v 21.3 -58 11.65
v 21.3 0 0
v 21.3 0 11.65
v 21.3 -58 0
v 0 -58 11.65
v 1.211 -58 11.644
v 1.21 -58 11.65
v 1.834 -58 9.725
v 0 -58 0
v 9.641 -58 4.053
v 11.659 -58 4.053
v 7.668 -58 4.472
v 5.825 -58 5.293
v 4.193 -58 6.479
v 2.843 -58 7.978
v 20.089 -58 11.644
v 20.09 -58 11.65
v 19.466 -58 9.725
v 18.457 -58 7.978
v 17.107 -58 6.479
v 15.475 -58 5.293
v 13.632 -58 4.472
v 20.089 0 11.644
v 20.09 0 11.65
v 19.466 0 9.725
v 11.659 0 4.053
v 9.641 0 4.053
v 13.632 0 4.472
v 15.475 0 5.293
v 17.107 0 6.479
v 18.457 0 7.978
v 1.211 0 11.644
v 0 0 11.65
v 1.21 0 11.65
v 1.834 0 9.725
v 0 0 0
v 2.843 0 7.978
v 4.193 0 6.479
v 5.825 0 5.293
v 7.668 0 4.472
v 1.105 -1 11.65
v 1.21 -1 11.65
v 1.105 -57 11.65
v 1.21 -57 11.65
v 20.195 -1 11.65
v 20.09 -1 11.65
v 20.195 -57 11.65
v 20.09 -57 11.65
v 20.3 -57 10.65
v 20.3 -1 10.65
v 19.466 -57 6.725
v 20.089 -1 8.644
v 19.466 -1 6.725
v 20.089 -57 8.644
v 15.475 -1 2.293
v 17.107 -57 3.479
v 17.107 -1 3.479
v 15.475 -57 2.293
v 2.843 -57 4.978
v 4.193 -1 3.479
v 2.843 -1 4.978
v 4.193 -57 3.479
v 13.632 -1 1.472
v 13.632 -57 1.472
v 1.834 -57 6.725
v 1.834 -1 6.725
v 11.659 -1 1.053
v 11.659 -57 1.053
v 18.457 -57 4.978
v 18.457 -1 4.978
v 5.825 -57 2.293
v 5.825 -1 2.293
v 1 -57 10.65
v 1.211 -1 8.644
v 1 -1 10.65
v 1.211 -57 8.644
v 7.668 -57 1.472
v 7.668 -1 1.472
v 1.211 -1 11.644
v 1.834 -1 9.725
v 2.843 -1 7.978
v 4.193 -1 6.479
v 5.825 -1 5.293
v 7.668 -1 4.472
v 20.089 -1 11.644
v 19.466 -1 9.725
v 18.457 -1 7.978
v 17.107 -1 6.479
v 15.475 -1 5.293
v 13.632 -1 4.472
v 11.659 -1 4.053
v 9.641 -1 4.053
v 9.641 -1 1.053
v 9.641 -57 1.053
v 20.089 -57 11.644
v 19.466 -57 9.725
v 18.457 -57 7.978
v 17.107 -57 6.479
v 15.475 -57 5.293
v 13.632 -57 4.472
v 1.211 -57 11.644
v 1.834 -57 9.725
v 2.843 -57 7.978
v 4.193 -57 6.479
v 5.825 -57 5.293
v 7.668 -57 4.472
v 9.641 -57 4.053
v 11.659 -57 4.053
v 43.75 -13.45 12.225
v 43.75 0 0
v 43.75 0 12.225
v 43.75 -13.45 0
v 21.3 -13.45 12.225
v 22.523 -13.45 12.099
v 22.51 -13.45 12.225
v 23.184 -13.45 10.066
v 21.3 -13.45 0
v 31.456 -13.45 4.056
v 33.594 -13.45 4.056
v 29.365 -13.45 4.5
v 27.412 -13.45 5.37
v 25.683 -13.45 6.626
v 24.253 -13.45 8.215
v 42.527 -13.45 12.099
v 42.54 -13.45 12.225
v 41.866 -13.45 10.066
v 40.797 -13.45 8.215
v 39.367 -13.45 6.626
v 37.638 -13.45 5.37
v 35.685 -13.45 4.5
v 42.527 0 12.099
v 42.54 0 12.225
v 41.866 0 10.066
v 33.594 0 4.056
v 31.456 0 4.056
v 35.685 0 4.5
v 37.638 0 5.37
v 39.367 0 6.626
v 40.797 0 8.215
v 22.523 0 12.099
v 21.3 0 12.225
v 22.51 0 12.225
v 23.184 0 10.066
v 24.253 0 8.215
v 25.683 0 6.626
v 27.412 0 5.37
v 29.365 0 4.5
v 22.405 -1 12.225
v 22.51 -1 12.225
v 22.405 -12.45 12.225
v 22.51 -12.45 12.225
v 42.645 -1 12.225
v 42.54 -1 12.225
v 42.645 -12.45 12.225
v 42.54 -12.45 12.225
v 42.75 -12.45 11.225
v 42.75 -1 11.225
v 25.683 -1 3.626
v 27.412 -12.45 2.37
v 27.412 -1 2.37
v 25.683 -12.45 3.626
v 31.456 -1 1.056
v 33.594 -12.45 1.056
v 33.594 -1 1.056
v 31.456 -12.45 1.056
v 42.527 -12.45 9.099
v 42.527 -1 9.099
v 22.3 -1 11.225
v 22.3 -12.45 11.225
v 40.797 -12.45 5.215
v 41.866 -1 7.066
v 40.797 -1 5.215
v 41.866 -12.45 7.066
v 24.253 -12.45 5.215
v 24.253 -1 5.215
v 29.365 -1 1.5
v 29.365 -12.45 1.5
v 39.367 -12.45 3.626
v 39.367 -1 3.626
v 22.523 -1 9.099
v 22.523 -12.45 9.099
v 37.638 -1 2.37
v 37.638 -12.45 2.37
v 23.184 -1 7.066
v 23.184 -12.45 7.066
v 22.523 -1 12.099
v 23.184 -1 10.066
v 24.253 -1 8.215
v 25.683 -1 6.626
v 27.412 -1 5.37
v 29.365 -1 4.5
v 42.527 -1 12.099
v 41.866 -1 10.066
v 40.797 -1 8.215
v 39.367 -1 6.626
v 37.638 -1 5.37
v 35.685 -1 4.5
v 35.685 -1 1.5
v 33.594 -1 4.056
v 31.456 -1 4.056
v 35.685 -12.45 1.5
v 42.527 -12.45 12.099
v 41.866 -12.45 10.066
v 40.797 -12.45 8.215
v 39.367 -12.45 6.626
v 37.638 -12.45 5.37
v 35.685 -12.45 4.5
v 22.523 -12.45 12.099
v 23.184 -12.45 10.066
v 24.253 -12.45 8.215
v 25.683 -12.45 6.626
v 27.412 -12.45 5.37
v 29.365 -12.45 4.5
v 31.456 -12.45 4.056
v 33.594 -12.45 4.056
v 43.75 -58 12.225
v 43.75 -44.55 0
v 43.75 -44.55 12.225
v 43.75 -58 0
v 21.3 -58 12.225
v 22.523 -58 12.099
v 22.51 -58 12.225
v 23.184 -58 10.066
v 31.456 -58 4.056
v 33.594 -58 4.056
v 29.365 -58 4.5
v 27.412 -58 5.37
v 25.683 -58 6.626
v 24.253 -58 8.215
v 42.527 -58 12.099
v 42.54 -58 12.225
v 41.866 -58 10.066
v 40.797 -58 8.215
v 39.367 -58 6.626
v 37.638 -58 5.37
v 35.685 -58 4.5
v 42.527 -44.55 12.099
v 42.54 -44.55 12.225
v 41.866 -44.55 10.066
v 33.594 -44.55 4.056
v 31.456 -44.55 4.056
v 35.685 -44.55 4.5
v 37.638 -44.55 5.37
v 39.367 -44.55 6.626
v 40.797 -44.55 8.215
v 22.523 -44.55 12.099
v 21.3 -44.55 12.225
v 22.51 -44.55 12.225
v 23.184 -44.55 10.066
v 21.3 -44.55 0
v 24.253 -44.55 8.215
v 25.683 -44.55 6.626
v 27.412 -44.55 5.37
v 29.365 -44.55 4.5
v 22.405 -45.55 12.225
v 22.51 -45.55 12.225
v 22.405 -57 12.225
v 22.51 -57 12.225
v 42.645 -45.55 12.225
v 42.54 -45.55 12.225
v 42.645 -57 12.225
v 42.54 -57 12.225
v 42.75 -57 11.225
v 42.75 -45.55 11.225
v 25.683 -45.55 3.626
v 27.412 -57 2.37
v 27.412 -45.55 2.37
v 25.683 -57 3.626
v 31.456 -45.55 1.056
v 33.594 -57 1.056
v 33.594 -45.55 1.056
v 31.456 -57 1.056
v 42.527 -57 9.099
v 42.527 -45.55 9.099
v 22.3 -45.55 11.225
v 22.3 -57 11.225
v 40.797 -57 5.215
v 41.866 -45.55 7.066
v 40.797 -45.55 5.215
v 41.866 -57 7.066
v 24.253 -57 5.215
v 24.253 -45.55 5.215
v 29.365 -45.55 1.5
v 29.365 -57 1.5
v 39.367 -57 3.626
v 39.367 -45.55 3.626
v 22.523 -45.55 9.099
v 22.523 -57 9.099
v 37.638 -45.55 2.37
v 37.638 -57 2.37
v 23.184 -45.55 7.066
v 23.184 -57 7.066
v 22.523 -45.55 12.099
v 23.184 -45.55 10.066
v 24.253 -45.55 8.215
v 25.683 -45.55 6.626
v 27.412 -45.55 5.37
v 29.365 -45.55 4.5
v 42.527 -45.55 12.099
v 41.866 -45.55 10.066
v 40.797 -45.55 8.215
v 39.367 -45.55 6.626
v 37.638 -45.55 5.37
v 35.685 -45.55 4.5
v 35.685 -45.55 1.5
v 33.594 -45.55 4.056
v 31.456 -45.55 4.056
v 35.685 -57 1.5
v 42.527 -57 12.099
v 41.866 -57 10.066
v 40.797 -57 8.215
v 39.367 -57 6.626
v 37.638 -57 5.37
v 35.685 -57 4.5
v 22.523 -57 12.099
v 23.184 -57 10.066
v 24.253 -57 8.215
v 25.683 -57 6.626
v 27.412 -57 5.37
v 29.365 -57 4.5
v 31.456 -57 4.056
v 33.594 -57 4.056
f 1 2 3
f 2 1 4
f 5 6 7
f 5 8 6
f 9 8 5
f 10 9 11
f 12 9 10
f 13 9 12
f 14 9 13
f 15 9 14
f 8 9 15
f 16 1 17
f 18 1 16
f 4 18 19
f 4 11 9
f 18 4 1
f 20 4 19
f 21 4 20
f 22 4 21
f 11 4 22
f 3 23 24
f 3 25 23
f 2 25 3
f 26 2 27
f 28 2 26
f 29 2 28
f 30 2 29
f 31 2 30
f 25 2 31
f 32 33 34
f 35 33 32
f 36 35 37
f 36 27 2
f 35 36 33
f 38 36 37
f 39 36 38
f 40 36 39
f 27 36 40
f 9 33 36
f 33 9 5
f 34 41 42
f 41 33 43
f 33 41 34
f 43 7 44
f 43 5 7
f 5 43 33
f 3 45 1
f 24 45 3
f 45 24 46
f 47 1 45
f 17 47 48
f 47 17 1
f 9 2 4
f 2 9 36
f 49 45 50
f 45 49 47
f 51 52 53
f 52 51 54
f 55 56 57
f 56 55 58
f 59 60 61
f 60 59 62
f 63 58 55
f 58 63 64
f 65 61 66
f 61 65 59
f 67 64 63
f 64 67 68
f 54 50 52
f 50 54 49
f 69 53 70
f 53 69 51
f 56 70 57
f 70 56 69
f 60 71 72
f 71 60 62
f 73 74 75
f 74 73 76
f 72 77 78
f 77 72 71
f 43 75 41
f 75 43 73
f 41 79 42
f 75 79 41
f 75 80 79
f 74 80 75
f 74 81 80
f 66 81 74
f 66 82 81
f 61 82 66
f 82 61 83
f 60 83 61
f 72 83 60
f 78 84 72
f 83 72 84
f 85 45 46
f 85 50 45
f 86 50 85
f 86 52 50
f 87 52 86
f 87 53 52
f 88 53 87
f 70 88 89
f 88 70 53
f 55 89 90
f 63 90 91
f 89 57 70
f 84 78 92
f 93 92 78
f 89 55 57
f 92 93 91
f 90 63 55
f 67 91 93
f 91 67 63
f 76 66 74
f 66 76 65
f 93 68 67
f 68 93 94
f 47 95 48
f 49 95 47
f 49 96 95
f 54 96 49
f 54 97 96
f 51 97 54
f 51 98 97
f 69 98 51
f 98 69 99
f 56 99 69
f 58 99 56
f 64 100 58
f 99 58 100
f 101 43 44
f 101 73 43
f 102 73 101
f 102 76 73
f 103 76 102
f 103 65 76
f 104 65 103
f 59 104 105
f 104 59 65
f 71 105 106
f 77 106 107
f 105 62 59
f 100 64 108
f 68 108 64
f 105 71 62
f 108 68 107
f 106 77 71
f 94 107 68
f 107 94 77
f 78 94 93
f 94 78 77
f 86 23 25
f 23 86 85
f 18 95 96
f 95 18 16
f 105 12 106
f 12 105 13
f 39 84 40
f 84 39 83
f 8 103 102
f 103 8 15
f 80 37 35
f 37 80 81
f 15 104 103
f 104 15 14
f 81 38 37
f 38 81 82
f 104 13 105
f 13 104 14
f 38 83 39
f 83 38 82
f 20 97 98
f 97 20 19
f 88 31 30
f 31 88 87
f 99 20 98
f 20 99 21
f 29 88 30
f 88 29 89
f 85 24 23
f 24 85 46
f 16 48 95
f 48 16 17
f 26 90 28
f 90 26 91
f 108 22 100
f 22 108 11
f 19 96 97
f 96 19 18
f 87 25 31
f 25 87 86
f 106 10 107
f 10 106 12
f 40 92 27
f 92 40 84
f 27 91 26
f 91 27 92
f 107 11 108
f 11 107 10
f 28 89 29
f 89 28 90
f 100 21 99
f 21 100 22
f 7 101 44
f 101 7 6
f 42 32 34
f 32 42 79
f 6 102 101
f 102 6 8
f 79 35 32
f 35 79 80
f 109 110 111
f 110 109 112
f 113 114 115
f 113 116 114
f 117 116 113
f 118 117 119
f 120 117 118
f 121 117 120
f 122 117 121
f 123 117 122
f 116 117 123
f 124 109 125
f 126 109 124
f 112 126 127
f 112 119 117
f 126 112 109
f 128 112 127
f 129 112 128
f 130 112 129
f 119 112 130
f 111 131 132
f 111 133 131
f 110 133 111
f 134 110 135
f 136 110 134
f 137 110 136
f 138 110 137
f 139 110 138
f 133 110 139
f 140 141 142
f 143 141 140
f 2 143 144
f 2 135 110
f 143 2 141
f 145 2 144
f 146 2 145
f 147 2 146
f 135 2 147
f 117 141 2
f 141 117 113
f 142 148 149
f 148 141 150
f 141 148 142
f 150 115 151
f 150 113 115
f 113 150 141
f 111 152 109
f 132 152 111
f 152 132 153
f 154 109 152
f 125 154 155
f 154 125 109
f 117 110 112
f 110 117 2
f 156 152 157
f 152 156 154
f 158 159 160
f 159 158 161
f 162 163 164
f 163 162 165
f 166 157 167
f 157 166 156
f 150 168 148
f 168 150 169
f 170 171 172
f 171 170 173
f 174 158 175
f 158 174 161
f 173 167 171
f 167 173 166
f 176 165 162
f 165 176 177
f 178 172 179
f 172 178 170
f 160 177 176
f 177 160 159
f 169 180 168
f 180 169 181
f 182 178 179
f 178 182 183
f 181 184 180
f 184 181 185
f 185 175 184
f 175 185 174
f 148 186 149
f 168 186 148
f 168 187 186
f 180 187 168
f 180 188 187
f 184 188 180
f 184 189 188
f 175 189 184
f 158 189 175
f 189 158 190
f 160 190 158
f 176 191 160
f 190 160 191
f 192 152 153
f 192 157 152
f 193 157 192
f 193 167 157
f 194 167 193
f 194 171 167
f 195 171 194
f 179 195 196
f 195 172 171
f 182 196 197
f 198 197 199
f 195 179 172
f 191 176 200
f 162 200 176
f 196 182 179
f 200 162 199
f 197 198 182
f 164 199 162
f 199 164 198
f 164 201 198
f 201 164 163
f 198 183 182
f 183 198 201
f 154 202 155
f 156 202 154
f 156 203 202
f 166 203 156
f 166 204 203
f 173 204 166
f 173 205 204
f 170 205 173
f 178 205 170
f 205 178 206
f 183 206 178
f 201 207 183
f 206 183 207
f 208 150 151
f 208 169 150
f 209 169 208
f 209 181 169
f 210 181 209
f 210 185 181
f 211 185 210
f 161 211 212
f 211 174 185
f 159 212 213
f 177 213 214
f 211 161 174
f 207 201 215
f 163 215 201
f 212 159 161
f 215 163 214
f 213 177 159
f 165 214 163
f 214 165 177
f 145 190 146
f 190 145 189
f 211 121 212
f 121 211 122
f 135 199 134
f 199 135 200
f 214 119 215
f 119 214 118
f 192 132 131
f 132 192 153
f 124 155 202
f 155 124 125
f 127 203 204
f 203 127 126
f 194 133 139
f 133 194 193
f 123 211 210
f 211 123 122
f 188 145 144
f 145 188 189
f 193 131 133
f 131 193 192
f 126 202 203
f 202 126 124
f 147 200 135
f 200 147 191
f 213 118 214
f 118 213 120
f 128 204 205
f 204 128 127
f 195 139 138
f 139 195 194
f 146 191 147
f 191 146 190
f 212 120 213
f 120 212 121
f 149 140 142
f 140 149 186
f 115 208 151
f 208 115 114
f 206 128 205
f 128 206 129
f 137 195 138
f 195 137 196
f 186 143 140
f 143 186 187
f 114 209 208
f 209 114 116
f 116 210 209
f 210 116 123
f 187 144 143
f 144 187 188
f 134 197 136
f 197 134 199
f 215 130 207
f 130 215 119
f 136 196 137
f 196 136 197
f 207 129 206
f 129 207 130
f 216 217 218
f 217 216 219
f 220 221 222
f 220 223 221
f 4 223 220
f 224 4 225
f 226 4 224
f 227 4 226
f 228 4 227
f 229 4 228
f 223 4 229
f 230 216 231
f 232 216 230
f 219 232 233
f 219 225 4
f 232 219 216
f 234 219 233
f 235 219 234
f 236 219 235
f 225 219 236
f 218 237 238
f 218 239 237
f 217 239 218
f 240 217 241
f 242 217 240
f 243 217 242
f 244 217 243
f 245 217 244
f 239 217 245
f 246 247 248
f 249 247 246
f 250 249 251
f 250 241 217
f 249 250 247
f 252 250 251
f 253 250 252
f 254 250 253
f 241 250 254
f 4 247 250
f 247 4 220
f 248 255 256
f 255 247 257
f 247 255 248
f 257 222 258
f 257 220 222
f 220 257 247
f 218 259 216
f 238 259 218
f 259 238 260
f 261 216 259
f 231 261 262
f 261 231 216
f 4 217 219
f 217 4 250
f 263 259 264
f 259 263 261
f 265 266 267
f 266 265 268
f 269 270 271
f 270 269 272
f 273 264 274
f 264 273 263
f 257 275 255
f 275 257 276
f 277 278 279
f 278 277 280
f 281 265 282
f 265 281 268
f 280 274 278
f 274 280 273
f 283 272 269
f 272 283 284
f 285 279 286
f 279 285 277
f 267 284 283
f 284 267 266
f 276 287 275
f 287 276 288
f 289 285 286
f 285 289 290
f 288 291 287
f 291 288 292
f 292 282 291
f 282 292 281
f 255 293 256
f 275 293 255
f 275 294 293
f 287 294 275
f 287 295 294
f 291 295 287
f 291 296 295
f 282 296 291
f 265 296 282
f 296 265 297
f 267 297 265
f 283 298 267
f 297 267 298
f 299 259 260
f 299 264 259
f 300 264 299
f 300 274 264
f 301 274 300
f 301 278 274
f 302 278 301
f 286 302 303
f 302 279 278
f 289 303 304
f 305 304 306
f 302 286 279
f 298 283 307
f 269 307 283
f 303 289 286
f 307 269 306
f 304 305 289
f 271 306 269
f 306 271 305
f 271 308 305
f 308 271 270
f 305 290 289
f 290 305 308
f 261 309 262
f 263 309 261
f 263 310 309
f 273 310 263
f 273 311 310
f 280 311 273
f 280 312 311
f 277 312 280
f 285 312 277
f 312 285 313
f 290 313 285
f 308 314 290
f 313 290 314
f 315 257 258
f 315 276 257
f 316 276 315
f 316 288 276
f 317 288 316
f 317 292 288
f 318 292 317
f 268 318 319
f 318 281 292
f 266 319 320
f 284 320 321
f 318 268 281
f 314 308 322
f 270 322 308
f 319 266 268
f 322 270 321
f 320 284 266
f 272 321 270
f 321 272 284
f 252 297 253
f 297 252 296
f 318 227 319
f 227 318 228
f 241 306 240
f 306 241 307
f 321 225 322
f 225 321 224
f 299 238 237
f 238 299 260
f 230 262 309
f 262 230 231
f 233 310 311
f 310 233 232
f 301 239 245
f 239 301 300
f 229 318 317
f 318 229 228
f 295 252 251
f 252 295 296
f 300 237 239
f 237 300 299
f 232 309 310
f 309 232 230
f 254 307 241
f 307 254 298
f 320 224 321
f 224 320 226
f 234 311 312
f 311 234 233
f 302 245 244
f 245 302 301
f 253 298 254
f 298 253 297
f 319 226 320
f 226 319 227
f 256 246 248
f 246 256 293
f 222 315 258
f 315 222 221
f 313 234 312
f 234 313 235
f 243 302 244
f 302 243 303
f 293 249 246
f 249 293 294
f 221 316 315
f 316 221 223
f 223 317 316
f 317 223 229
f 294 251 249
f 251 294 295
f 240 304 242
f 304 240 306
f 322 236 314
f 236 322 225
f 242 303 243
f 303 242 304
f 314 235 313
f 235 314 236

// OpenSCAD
module lowerSpool(x, y, wallThick){
    spoolDiam = 20.45;
    spoolRad = spoolDiam / 2;
    spoolHeight = 11.45;
    doubleWall = wallThick * 2;
    
    rotate([90, 0, 0]) {
        difference() {
            cube([spoolDiam + doubleWall, spoolRad + doubleWall, spoolHeight + doubleWall]);

            translate([spoolDiam / 2 + wallThick, spoolDiam / 2 + wallThick, wallThick]) {
                cylinder(spoolHeight, r=spoolRad);
            }
            
            translate([spoolDiam / 2 + wallThick, spoolDiam / 2 + wallThick * 4, 0]) {
                cylinder(spoolHeight + doubleWall, r=spoolRad);
            }
        }
    }   
}

module normalSpool(x, y, wallThick) {
    spoolDiam = 19.3;
    spoolRad = spoolDiam / 2;
    spoolHeight = 56;
    doubleWall = wallThick * 2; 
    
    rotate([90, 0, 0]) {
        difference() {
            cube([spoolDiam + doubleWall, spoolRad + doubleWall, spoolHeight + doubleWall]);

            translate([spoolDiam / 2 + wallThick, spoolDiam / 2 + wallThick, wallThick]) {
                cylinder(spoolHeight, r=spoolRad);
            }
            
            translate([spoolDiam / 2 + wallThick, spoolDiam / 2 + wallThick * 4, 0]) {
                cylinder(spoolHeight + doubleWall, r=spoolRad);
            }
        }
    }   
}

wallThickness=1;

normalSpool(0, 0, wallThickness);

translate([19.3+wallThickness*2, 0 , 0]) {
    lowerSpool(0, 0 , wallThickness);
    
        translate([0, -56  + 11.45 , 0]) {
        lowerSpool(0, 0 , wallThickness);
    }
}
